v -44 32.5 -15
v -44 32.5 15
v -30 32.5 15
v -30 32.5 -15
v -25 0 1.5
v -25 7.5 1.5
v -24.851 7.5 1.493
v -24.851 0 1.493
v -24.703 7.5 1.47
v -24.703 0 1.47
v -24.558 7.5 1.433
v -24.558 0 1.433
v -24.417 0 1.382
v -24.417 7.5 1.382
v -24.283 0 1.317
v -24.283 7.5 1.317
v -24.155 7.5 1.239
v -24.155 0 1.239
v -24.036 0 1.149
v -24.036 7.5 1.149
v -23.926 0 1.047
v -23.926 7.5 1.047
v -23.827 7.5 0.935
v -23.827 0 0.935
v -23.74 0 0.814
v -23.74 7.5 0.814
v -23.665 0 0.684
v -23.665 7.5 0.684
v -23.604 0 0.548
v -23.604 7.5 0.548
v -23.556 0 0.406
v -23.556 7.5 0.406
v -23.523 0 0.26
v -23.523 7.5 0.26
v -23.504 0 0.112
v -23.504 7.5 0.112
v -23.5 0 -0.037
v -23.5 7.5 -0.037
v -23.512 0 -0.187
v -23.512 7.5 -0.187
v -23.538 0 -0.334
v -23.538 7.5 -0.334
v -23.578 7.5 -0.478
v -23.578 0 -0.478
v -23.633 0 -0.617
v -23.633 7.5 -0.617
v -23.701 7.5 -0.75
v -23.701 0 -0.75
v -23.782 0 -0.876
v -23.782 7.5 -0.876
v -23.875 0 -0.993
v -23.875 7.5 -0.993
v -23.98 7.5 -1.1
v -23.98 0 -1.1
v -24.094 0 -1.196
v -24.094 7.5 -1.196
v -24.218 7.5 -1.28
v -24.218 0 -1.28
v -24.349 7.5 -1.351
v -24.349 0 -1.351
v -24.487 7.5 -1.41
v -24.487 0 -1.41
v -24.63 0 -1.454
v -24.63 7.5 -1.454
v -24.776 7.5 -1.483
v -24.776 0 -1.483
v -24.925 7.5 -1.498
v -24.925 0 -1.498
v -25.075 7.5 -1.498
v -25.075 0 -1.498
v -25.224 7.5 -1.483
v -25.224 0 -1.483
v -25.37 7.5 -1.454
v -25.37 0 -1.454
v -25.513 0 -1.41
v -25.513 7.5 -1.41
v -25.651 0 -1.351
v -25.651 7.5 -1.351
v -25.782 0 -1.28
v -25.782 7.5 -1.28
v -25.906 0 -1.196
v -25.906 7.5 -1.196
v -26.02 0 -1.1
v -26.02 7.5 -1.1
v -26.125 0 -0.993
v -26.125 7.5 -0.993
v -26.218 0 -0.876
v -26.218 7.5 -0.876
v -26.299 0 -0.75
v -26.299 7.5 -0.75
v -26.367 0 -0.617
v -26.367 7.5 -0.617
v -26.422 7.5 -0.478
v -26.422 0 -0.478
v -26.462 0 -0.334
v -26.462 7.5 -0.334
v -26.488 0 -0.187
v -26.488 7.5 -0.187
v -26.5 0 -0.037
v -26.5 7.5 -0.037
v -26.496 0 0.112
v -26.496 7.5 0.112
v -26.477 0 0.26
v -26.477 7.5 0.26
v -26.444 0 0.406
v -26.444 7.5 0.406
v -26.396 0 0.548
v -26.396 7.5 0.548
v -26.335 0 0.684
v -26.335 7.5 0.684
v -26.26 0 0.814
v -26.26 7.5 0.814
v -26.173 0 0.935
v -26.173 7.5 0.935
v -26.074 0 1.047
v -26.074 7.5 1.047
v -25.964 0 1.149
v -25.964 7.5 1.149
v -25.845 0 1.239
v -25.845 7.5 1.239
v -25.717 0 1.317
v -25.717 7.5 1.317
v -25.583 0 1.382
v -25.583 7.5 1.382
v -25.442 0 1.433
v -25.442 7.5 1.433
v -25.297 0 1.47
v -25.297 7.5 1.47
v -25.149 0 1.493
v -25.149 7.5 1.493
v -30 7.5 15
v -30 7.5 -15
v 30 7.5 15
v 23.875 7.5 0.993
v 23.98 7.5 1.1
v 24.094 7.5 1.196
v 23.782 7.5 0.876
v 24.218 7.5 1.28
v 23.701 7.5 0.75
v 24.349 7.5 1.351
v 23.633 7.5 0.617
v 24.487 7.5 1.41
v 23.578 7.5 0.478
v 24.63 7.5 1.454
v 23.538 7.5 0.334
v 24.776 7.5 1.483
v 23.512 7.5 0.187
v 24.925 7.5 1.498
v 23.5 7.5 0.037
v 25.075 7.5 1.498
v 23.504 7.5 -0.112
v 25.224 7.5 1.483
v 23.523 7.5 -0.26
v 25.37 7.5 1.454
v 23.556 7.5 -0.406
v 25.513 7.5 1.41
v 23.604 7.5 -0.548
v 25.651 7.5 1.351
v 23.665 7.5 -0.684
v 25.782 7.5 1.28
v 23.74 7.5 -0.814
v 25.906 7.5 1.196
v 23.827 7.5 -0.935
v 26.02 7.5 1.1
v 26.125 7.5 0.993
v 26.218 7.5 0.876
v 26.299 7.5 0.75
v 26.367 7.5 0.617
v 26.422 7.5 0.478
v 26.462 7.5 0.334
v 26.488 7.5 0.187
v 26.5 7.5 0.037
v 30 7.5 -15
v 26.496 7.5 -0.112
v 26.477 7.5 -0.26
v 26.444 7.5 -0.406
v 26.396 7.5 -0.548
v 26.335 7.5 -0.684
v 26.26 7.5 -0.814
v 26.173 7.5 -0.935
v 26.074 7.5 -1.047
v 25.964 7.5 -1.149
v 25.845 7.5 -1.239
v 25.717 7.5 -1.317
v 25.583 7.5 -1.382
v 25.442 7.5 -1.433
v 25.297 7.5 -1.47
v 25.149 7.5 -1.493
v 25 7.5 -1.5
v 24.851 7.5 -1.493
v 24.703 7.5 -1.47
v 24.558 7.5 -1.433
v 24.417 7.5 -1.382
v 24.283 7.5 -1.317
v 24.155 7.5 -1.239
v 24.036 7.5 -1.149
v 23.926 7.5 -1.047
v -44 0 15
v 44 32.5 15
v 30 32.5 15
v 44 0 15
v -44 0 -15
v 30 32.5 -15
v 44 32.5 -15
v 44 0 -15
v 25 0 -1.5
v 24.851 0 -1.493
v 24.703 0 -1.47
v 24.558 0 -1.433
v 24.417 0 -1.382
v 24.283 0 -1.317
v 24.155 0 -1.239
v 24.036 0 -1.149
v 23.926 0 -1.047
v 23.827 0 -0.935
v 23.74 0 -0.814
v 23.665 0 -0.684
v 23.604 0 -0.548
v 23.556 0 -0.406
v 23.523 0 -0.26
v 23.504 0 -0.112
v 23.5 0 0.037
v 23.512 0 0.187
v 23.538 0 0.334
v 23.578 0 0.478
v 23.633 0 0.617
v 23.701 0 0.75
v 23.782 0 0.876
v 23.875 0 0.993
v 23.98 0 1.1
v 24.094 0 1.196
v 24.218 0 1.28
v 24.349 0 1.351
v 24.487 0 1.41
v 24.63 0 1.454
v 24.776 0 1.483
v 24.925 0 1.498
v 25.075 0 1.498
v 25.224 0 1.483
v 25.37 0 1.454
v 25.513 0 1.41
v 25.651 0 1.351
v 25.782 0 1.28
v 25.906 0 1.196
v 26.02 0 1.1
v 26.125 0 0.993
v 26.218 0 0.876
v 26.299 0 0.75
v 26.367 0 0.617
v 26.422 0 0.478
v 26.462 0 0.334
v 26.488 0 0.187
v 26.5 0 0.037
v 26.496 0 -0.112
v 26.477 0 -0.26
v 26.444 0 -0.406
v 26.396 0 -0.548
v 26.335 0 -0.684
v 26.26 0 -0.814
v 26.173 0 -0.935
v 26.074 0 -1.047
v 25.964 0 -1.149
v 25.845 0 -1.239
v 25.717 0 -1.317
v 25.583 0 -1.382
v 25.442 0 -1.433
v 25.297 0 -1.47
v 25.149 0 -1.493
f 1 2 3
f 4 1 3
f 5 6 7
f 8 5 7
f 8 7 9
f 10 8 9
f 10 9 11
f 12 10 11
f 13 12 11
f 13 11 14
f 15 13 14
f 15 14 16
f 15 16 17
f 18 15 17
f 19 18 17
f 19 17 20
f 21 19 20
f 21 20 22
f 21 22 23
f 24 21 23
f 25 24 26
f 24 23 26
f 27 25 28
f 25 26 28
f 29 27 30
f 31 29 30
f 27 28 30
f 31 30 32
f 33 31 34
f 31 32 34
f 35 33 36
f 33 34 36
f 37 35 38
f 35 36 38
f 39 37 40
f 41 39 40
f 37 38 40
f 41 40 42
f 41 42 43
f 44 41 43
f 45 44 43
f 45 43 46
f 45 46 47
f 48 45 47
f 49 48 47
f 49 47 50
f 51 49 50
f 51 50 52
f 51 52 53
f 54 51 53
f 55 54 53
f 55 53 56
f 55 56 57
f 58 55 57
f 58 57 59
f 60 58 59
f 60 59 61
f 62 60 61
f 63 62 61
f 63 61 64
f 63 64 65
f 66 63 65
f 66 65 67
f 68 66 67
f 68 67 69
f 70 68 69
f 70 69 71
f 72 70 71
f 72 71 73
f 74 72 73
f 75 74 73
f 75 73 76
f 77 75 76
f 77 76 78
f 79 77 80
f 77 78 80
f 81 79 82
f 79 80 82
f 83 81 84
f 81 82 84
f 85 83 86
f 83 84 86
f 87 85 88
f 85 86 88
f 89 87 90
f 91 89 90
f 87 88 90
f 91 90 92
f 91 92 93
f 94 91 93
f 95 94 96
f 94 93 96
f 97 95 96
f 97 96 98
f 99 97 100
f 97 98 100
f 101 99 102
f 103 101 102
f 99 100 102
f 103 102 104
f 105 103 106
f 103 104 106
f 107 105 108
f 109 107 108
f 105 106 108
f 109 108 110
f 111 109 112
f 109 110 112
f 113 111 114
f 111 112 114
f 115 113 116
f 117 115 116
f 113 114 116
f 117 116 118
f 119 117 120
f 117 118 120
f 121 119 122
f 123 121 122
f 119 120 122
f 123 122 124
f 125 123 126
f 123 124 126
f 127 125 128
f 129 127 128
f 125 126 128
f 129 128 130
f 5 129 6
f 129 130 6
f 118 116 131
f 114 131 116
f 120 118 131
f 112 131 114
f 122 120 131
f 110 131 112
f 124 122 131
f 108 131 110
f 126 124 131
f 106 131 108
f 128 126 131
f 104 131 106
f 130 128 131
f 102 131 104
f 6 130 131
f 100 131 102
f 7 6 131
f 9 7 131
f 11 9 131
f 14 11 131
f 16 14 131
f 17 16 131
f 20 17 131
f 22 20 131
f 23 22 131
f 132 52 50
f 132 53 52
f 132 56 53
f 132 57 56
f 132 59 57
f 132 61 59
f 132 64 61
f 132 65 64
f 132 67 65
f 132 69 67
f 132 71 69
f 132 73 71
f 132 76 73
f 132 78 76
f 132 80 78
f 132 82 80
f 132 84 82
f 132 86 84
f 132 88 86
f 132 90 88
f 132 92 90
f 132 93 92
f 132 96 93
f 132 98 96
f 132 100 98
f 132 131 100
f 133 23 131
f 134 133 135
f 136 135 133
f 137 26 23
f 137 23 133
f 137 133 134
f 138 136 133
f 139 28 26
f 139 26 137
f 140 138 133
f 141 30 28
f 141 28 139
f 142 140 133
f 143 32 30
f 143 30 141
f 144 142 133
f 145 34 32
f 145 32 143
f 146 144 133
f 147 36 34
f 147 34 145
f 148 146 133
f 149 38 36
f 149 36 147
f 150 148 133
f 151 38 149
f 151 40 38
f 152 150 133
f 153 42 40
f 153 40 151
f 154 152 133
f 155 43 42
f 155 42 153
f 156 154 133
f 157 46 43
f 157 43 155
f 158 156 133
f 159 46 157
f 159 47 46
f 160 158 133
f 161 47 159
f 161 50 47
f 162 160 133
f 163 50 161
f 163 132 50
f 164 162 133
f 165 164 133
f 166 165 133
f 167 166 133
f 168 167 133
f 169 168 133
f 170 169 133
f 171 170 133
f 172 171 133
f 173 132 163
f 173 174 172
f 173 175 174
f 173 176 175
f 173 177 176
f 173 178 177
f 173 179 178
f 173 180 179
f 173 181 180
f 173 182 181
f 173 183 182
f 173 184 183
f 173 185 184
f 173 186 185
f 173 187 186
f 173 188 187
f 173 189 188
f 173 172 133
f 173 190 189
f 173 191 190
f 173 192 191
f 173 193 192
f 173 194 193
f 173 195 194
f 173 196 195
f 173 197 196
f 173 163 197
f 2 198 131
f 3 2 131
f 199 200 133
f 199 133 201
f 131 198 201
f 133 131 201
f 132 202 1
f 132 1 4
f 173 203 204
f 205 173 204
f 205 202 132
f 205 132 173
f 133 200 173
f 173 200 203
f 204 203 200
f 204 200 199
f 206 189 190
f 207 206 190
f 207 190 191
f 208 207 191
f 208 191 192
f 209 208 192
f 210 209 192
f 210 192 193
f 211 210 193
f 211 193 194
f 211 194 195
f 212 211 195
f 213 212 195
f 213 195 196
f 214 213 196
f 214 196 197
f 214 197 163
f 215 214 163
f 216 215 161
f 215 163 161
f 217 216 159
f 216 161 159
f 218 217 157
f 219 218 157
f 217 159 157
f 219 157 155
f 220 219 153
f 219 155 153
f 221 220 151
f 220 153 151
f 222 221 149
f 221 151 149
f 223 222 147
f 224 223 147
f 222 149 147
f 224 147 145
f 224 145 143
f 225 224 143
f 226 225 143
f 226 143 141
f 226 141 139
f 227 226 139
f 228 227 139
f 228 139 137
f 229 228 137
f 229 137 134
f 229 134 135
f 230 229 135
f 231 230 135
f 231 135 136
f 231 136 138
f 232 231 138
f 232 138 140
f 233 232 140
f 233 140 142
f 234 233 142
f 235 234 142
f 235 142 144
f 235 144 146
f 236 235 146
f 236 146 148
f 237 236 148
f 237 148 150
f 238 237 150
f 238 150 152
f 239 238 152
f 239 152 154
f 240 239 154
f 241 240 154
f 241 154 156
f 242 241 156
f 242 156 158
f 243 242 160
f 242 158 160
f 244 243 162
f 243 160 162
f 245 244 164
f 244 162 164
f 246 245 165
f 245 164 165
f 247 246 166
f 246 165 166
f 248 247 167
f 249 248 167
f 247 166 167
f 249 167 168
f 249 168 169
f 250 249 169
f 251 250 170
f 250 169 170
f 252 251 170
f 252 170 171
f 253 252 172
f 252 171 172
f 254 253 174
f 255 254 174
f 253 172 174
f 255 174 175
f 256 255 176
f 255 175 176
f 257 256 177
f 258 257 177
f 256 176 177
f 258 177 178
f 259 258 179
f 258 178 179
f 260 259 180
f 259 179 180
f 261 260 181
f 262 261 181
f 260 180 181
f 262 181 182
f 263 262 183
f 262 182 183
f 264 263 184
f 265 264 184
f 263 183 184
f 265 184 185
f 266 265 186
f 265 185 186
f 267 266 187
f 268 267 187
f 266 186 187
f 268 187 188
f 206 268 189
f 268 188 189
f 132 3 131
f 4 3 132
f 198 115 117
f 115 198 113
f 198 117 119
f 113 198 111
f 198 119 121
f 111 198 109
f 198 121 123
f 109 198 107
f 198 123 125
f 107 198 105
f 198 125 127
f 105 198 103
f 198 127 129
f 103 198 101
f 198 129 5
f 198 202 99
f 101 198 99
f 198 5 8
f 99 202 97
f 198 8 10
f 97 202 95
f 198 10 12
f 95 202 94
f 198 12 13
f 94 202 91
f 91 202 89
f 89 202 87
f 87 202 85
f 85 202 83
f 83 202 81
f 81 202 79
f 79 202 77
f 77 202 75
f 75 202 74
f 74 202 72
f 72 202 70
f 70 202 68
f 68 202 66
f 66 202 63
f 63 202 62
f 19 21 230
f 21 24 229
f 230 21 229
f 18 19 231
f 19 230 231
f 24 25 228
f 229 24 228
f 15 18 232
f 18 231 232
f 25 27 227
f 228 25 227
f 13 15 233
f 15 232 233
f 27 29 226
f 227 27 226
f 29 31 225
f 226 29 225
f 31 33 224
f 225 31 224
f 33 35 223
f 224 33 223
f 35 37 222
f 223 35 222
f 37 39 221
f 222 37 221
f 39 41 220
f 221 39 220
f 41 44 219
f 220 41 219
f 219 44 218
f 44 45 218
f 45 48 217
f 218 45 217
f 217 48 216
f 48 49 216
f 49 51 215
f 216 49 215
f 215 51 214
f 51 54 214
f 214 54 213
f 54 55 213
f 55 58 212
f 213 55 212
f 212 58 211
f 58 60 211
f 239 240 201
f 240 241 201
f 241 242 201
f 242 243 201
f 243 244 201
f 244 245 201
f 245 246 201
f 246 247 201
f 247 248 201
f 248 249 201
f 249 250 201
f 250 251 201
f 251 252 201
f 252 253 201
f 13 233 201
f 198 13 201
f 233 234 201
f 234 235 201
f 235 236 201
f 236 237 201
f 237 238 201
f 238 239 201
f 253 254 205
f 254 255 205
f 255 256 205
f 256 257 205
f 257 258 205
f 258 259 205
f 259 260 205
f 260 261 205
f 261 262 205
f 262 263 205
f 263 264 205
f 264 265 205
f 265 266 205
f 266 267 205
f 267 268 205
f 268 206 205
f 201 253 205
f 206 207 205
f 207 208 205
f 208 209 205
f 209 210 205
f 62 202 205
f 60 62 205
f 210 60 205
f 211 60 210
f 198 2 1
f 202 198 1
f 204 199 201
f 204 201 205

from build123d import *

# Parameters (mm, degrees)
SKETCH_1_W          = 88
SKETCH_1_H          = 30
EXTRUDE_1_DEPTH     = 32.5
SKETCH_2_R          = 1.5
CUT_EXTRUDE_1_DEPTH = 57.72080747
SKETCH_3_W          = 60
SKETCH_3_H          = 30
CUT_EXTRUDE_2_DEPTH = 25


with BuildPart() as part:
    # 草图1 → 凸台-拉伸1 (new body)
    with BuildSketch(Plane(origin=(0, 0, 0), x_dir=(1, 0, 0), z_dir=(0, 1, 0))):
        Rectangle(SKETCH_1_W, SKETCH_1_H)
    extrude(amount=EXTRUDE_1_DEPTH)

    # 草图2 → 切除-拉伸1 (cut, through all)
    with BuildSketch(Plane(origin=(0, 32.5, 0), x_dir=(1, 0, 0), z_dir=(0, 1, 0))):
        with Locations(Location((-25, 0, 0), (0, 0, 270))):
            Circle(SKETCH_2_R)
        with Locations(Location((25, 0, 0), (0, 0, 90))):
            Circle(SKETCH_2_R)
    extrude(amount=-CUT_EXTRUDE_1_DEPTH, mode=Mode.SUBTRACT)

    # 草图3 → 切除-拉伸2 (cut)
    with BuildSketch(Plane(origin=(0, 32.5, 0), x_dir=(1, 0, 0), z_dir=(0, 1, 0))):
        Rectangle(SKETCH_3_W, SKETCH_3_H)
    extrude(amount=-CUT_EXTRUDE_2_DEPTH, mode=Mode.SUBTRACT)


solid = part.part
